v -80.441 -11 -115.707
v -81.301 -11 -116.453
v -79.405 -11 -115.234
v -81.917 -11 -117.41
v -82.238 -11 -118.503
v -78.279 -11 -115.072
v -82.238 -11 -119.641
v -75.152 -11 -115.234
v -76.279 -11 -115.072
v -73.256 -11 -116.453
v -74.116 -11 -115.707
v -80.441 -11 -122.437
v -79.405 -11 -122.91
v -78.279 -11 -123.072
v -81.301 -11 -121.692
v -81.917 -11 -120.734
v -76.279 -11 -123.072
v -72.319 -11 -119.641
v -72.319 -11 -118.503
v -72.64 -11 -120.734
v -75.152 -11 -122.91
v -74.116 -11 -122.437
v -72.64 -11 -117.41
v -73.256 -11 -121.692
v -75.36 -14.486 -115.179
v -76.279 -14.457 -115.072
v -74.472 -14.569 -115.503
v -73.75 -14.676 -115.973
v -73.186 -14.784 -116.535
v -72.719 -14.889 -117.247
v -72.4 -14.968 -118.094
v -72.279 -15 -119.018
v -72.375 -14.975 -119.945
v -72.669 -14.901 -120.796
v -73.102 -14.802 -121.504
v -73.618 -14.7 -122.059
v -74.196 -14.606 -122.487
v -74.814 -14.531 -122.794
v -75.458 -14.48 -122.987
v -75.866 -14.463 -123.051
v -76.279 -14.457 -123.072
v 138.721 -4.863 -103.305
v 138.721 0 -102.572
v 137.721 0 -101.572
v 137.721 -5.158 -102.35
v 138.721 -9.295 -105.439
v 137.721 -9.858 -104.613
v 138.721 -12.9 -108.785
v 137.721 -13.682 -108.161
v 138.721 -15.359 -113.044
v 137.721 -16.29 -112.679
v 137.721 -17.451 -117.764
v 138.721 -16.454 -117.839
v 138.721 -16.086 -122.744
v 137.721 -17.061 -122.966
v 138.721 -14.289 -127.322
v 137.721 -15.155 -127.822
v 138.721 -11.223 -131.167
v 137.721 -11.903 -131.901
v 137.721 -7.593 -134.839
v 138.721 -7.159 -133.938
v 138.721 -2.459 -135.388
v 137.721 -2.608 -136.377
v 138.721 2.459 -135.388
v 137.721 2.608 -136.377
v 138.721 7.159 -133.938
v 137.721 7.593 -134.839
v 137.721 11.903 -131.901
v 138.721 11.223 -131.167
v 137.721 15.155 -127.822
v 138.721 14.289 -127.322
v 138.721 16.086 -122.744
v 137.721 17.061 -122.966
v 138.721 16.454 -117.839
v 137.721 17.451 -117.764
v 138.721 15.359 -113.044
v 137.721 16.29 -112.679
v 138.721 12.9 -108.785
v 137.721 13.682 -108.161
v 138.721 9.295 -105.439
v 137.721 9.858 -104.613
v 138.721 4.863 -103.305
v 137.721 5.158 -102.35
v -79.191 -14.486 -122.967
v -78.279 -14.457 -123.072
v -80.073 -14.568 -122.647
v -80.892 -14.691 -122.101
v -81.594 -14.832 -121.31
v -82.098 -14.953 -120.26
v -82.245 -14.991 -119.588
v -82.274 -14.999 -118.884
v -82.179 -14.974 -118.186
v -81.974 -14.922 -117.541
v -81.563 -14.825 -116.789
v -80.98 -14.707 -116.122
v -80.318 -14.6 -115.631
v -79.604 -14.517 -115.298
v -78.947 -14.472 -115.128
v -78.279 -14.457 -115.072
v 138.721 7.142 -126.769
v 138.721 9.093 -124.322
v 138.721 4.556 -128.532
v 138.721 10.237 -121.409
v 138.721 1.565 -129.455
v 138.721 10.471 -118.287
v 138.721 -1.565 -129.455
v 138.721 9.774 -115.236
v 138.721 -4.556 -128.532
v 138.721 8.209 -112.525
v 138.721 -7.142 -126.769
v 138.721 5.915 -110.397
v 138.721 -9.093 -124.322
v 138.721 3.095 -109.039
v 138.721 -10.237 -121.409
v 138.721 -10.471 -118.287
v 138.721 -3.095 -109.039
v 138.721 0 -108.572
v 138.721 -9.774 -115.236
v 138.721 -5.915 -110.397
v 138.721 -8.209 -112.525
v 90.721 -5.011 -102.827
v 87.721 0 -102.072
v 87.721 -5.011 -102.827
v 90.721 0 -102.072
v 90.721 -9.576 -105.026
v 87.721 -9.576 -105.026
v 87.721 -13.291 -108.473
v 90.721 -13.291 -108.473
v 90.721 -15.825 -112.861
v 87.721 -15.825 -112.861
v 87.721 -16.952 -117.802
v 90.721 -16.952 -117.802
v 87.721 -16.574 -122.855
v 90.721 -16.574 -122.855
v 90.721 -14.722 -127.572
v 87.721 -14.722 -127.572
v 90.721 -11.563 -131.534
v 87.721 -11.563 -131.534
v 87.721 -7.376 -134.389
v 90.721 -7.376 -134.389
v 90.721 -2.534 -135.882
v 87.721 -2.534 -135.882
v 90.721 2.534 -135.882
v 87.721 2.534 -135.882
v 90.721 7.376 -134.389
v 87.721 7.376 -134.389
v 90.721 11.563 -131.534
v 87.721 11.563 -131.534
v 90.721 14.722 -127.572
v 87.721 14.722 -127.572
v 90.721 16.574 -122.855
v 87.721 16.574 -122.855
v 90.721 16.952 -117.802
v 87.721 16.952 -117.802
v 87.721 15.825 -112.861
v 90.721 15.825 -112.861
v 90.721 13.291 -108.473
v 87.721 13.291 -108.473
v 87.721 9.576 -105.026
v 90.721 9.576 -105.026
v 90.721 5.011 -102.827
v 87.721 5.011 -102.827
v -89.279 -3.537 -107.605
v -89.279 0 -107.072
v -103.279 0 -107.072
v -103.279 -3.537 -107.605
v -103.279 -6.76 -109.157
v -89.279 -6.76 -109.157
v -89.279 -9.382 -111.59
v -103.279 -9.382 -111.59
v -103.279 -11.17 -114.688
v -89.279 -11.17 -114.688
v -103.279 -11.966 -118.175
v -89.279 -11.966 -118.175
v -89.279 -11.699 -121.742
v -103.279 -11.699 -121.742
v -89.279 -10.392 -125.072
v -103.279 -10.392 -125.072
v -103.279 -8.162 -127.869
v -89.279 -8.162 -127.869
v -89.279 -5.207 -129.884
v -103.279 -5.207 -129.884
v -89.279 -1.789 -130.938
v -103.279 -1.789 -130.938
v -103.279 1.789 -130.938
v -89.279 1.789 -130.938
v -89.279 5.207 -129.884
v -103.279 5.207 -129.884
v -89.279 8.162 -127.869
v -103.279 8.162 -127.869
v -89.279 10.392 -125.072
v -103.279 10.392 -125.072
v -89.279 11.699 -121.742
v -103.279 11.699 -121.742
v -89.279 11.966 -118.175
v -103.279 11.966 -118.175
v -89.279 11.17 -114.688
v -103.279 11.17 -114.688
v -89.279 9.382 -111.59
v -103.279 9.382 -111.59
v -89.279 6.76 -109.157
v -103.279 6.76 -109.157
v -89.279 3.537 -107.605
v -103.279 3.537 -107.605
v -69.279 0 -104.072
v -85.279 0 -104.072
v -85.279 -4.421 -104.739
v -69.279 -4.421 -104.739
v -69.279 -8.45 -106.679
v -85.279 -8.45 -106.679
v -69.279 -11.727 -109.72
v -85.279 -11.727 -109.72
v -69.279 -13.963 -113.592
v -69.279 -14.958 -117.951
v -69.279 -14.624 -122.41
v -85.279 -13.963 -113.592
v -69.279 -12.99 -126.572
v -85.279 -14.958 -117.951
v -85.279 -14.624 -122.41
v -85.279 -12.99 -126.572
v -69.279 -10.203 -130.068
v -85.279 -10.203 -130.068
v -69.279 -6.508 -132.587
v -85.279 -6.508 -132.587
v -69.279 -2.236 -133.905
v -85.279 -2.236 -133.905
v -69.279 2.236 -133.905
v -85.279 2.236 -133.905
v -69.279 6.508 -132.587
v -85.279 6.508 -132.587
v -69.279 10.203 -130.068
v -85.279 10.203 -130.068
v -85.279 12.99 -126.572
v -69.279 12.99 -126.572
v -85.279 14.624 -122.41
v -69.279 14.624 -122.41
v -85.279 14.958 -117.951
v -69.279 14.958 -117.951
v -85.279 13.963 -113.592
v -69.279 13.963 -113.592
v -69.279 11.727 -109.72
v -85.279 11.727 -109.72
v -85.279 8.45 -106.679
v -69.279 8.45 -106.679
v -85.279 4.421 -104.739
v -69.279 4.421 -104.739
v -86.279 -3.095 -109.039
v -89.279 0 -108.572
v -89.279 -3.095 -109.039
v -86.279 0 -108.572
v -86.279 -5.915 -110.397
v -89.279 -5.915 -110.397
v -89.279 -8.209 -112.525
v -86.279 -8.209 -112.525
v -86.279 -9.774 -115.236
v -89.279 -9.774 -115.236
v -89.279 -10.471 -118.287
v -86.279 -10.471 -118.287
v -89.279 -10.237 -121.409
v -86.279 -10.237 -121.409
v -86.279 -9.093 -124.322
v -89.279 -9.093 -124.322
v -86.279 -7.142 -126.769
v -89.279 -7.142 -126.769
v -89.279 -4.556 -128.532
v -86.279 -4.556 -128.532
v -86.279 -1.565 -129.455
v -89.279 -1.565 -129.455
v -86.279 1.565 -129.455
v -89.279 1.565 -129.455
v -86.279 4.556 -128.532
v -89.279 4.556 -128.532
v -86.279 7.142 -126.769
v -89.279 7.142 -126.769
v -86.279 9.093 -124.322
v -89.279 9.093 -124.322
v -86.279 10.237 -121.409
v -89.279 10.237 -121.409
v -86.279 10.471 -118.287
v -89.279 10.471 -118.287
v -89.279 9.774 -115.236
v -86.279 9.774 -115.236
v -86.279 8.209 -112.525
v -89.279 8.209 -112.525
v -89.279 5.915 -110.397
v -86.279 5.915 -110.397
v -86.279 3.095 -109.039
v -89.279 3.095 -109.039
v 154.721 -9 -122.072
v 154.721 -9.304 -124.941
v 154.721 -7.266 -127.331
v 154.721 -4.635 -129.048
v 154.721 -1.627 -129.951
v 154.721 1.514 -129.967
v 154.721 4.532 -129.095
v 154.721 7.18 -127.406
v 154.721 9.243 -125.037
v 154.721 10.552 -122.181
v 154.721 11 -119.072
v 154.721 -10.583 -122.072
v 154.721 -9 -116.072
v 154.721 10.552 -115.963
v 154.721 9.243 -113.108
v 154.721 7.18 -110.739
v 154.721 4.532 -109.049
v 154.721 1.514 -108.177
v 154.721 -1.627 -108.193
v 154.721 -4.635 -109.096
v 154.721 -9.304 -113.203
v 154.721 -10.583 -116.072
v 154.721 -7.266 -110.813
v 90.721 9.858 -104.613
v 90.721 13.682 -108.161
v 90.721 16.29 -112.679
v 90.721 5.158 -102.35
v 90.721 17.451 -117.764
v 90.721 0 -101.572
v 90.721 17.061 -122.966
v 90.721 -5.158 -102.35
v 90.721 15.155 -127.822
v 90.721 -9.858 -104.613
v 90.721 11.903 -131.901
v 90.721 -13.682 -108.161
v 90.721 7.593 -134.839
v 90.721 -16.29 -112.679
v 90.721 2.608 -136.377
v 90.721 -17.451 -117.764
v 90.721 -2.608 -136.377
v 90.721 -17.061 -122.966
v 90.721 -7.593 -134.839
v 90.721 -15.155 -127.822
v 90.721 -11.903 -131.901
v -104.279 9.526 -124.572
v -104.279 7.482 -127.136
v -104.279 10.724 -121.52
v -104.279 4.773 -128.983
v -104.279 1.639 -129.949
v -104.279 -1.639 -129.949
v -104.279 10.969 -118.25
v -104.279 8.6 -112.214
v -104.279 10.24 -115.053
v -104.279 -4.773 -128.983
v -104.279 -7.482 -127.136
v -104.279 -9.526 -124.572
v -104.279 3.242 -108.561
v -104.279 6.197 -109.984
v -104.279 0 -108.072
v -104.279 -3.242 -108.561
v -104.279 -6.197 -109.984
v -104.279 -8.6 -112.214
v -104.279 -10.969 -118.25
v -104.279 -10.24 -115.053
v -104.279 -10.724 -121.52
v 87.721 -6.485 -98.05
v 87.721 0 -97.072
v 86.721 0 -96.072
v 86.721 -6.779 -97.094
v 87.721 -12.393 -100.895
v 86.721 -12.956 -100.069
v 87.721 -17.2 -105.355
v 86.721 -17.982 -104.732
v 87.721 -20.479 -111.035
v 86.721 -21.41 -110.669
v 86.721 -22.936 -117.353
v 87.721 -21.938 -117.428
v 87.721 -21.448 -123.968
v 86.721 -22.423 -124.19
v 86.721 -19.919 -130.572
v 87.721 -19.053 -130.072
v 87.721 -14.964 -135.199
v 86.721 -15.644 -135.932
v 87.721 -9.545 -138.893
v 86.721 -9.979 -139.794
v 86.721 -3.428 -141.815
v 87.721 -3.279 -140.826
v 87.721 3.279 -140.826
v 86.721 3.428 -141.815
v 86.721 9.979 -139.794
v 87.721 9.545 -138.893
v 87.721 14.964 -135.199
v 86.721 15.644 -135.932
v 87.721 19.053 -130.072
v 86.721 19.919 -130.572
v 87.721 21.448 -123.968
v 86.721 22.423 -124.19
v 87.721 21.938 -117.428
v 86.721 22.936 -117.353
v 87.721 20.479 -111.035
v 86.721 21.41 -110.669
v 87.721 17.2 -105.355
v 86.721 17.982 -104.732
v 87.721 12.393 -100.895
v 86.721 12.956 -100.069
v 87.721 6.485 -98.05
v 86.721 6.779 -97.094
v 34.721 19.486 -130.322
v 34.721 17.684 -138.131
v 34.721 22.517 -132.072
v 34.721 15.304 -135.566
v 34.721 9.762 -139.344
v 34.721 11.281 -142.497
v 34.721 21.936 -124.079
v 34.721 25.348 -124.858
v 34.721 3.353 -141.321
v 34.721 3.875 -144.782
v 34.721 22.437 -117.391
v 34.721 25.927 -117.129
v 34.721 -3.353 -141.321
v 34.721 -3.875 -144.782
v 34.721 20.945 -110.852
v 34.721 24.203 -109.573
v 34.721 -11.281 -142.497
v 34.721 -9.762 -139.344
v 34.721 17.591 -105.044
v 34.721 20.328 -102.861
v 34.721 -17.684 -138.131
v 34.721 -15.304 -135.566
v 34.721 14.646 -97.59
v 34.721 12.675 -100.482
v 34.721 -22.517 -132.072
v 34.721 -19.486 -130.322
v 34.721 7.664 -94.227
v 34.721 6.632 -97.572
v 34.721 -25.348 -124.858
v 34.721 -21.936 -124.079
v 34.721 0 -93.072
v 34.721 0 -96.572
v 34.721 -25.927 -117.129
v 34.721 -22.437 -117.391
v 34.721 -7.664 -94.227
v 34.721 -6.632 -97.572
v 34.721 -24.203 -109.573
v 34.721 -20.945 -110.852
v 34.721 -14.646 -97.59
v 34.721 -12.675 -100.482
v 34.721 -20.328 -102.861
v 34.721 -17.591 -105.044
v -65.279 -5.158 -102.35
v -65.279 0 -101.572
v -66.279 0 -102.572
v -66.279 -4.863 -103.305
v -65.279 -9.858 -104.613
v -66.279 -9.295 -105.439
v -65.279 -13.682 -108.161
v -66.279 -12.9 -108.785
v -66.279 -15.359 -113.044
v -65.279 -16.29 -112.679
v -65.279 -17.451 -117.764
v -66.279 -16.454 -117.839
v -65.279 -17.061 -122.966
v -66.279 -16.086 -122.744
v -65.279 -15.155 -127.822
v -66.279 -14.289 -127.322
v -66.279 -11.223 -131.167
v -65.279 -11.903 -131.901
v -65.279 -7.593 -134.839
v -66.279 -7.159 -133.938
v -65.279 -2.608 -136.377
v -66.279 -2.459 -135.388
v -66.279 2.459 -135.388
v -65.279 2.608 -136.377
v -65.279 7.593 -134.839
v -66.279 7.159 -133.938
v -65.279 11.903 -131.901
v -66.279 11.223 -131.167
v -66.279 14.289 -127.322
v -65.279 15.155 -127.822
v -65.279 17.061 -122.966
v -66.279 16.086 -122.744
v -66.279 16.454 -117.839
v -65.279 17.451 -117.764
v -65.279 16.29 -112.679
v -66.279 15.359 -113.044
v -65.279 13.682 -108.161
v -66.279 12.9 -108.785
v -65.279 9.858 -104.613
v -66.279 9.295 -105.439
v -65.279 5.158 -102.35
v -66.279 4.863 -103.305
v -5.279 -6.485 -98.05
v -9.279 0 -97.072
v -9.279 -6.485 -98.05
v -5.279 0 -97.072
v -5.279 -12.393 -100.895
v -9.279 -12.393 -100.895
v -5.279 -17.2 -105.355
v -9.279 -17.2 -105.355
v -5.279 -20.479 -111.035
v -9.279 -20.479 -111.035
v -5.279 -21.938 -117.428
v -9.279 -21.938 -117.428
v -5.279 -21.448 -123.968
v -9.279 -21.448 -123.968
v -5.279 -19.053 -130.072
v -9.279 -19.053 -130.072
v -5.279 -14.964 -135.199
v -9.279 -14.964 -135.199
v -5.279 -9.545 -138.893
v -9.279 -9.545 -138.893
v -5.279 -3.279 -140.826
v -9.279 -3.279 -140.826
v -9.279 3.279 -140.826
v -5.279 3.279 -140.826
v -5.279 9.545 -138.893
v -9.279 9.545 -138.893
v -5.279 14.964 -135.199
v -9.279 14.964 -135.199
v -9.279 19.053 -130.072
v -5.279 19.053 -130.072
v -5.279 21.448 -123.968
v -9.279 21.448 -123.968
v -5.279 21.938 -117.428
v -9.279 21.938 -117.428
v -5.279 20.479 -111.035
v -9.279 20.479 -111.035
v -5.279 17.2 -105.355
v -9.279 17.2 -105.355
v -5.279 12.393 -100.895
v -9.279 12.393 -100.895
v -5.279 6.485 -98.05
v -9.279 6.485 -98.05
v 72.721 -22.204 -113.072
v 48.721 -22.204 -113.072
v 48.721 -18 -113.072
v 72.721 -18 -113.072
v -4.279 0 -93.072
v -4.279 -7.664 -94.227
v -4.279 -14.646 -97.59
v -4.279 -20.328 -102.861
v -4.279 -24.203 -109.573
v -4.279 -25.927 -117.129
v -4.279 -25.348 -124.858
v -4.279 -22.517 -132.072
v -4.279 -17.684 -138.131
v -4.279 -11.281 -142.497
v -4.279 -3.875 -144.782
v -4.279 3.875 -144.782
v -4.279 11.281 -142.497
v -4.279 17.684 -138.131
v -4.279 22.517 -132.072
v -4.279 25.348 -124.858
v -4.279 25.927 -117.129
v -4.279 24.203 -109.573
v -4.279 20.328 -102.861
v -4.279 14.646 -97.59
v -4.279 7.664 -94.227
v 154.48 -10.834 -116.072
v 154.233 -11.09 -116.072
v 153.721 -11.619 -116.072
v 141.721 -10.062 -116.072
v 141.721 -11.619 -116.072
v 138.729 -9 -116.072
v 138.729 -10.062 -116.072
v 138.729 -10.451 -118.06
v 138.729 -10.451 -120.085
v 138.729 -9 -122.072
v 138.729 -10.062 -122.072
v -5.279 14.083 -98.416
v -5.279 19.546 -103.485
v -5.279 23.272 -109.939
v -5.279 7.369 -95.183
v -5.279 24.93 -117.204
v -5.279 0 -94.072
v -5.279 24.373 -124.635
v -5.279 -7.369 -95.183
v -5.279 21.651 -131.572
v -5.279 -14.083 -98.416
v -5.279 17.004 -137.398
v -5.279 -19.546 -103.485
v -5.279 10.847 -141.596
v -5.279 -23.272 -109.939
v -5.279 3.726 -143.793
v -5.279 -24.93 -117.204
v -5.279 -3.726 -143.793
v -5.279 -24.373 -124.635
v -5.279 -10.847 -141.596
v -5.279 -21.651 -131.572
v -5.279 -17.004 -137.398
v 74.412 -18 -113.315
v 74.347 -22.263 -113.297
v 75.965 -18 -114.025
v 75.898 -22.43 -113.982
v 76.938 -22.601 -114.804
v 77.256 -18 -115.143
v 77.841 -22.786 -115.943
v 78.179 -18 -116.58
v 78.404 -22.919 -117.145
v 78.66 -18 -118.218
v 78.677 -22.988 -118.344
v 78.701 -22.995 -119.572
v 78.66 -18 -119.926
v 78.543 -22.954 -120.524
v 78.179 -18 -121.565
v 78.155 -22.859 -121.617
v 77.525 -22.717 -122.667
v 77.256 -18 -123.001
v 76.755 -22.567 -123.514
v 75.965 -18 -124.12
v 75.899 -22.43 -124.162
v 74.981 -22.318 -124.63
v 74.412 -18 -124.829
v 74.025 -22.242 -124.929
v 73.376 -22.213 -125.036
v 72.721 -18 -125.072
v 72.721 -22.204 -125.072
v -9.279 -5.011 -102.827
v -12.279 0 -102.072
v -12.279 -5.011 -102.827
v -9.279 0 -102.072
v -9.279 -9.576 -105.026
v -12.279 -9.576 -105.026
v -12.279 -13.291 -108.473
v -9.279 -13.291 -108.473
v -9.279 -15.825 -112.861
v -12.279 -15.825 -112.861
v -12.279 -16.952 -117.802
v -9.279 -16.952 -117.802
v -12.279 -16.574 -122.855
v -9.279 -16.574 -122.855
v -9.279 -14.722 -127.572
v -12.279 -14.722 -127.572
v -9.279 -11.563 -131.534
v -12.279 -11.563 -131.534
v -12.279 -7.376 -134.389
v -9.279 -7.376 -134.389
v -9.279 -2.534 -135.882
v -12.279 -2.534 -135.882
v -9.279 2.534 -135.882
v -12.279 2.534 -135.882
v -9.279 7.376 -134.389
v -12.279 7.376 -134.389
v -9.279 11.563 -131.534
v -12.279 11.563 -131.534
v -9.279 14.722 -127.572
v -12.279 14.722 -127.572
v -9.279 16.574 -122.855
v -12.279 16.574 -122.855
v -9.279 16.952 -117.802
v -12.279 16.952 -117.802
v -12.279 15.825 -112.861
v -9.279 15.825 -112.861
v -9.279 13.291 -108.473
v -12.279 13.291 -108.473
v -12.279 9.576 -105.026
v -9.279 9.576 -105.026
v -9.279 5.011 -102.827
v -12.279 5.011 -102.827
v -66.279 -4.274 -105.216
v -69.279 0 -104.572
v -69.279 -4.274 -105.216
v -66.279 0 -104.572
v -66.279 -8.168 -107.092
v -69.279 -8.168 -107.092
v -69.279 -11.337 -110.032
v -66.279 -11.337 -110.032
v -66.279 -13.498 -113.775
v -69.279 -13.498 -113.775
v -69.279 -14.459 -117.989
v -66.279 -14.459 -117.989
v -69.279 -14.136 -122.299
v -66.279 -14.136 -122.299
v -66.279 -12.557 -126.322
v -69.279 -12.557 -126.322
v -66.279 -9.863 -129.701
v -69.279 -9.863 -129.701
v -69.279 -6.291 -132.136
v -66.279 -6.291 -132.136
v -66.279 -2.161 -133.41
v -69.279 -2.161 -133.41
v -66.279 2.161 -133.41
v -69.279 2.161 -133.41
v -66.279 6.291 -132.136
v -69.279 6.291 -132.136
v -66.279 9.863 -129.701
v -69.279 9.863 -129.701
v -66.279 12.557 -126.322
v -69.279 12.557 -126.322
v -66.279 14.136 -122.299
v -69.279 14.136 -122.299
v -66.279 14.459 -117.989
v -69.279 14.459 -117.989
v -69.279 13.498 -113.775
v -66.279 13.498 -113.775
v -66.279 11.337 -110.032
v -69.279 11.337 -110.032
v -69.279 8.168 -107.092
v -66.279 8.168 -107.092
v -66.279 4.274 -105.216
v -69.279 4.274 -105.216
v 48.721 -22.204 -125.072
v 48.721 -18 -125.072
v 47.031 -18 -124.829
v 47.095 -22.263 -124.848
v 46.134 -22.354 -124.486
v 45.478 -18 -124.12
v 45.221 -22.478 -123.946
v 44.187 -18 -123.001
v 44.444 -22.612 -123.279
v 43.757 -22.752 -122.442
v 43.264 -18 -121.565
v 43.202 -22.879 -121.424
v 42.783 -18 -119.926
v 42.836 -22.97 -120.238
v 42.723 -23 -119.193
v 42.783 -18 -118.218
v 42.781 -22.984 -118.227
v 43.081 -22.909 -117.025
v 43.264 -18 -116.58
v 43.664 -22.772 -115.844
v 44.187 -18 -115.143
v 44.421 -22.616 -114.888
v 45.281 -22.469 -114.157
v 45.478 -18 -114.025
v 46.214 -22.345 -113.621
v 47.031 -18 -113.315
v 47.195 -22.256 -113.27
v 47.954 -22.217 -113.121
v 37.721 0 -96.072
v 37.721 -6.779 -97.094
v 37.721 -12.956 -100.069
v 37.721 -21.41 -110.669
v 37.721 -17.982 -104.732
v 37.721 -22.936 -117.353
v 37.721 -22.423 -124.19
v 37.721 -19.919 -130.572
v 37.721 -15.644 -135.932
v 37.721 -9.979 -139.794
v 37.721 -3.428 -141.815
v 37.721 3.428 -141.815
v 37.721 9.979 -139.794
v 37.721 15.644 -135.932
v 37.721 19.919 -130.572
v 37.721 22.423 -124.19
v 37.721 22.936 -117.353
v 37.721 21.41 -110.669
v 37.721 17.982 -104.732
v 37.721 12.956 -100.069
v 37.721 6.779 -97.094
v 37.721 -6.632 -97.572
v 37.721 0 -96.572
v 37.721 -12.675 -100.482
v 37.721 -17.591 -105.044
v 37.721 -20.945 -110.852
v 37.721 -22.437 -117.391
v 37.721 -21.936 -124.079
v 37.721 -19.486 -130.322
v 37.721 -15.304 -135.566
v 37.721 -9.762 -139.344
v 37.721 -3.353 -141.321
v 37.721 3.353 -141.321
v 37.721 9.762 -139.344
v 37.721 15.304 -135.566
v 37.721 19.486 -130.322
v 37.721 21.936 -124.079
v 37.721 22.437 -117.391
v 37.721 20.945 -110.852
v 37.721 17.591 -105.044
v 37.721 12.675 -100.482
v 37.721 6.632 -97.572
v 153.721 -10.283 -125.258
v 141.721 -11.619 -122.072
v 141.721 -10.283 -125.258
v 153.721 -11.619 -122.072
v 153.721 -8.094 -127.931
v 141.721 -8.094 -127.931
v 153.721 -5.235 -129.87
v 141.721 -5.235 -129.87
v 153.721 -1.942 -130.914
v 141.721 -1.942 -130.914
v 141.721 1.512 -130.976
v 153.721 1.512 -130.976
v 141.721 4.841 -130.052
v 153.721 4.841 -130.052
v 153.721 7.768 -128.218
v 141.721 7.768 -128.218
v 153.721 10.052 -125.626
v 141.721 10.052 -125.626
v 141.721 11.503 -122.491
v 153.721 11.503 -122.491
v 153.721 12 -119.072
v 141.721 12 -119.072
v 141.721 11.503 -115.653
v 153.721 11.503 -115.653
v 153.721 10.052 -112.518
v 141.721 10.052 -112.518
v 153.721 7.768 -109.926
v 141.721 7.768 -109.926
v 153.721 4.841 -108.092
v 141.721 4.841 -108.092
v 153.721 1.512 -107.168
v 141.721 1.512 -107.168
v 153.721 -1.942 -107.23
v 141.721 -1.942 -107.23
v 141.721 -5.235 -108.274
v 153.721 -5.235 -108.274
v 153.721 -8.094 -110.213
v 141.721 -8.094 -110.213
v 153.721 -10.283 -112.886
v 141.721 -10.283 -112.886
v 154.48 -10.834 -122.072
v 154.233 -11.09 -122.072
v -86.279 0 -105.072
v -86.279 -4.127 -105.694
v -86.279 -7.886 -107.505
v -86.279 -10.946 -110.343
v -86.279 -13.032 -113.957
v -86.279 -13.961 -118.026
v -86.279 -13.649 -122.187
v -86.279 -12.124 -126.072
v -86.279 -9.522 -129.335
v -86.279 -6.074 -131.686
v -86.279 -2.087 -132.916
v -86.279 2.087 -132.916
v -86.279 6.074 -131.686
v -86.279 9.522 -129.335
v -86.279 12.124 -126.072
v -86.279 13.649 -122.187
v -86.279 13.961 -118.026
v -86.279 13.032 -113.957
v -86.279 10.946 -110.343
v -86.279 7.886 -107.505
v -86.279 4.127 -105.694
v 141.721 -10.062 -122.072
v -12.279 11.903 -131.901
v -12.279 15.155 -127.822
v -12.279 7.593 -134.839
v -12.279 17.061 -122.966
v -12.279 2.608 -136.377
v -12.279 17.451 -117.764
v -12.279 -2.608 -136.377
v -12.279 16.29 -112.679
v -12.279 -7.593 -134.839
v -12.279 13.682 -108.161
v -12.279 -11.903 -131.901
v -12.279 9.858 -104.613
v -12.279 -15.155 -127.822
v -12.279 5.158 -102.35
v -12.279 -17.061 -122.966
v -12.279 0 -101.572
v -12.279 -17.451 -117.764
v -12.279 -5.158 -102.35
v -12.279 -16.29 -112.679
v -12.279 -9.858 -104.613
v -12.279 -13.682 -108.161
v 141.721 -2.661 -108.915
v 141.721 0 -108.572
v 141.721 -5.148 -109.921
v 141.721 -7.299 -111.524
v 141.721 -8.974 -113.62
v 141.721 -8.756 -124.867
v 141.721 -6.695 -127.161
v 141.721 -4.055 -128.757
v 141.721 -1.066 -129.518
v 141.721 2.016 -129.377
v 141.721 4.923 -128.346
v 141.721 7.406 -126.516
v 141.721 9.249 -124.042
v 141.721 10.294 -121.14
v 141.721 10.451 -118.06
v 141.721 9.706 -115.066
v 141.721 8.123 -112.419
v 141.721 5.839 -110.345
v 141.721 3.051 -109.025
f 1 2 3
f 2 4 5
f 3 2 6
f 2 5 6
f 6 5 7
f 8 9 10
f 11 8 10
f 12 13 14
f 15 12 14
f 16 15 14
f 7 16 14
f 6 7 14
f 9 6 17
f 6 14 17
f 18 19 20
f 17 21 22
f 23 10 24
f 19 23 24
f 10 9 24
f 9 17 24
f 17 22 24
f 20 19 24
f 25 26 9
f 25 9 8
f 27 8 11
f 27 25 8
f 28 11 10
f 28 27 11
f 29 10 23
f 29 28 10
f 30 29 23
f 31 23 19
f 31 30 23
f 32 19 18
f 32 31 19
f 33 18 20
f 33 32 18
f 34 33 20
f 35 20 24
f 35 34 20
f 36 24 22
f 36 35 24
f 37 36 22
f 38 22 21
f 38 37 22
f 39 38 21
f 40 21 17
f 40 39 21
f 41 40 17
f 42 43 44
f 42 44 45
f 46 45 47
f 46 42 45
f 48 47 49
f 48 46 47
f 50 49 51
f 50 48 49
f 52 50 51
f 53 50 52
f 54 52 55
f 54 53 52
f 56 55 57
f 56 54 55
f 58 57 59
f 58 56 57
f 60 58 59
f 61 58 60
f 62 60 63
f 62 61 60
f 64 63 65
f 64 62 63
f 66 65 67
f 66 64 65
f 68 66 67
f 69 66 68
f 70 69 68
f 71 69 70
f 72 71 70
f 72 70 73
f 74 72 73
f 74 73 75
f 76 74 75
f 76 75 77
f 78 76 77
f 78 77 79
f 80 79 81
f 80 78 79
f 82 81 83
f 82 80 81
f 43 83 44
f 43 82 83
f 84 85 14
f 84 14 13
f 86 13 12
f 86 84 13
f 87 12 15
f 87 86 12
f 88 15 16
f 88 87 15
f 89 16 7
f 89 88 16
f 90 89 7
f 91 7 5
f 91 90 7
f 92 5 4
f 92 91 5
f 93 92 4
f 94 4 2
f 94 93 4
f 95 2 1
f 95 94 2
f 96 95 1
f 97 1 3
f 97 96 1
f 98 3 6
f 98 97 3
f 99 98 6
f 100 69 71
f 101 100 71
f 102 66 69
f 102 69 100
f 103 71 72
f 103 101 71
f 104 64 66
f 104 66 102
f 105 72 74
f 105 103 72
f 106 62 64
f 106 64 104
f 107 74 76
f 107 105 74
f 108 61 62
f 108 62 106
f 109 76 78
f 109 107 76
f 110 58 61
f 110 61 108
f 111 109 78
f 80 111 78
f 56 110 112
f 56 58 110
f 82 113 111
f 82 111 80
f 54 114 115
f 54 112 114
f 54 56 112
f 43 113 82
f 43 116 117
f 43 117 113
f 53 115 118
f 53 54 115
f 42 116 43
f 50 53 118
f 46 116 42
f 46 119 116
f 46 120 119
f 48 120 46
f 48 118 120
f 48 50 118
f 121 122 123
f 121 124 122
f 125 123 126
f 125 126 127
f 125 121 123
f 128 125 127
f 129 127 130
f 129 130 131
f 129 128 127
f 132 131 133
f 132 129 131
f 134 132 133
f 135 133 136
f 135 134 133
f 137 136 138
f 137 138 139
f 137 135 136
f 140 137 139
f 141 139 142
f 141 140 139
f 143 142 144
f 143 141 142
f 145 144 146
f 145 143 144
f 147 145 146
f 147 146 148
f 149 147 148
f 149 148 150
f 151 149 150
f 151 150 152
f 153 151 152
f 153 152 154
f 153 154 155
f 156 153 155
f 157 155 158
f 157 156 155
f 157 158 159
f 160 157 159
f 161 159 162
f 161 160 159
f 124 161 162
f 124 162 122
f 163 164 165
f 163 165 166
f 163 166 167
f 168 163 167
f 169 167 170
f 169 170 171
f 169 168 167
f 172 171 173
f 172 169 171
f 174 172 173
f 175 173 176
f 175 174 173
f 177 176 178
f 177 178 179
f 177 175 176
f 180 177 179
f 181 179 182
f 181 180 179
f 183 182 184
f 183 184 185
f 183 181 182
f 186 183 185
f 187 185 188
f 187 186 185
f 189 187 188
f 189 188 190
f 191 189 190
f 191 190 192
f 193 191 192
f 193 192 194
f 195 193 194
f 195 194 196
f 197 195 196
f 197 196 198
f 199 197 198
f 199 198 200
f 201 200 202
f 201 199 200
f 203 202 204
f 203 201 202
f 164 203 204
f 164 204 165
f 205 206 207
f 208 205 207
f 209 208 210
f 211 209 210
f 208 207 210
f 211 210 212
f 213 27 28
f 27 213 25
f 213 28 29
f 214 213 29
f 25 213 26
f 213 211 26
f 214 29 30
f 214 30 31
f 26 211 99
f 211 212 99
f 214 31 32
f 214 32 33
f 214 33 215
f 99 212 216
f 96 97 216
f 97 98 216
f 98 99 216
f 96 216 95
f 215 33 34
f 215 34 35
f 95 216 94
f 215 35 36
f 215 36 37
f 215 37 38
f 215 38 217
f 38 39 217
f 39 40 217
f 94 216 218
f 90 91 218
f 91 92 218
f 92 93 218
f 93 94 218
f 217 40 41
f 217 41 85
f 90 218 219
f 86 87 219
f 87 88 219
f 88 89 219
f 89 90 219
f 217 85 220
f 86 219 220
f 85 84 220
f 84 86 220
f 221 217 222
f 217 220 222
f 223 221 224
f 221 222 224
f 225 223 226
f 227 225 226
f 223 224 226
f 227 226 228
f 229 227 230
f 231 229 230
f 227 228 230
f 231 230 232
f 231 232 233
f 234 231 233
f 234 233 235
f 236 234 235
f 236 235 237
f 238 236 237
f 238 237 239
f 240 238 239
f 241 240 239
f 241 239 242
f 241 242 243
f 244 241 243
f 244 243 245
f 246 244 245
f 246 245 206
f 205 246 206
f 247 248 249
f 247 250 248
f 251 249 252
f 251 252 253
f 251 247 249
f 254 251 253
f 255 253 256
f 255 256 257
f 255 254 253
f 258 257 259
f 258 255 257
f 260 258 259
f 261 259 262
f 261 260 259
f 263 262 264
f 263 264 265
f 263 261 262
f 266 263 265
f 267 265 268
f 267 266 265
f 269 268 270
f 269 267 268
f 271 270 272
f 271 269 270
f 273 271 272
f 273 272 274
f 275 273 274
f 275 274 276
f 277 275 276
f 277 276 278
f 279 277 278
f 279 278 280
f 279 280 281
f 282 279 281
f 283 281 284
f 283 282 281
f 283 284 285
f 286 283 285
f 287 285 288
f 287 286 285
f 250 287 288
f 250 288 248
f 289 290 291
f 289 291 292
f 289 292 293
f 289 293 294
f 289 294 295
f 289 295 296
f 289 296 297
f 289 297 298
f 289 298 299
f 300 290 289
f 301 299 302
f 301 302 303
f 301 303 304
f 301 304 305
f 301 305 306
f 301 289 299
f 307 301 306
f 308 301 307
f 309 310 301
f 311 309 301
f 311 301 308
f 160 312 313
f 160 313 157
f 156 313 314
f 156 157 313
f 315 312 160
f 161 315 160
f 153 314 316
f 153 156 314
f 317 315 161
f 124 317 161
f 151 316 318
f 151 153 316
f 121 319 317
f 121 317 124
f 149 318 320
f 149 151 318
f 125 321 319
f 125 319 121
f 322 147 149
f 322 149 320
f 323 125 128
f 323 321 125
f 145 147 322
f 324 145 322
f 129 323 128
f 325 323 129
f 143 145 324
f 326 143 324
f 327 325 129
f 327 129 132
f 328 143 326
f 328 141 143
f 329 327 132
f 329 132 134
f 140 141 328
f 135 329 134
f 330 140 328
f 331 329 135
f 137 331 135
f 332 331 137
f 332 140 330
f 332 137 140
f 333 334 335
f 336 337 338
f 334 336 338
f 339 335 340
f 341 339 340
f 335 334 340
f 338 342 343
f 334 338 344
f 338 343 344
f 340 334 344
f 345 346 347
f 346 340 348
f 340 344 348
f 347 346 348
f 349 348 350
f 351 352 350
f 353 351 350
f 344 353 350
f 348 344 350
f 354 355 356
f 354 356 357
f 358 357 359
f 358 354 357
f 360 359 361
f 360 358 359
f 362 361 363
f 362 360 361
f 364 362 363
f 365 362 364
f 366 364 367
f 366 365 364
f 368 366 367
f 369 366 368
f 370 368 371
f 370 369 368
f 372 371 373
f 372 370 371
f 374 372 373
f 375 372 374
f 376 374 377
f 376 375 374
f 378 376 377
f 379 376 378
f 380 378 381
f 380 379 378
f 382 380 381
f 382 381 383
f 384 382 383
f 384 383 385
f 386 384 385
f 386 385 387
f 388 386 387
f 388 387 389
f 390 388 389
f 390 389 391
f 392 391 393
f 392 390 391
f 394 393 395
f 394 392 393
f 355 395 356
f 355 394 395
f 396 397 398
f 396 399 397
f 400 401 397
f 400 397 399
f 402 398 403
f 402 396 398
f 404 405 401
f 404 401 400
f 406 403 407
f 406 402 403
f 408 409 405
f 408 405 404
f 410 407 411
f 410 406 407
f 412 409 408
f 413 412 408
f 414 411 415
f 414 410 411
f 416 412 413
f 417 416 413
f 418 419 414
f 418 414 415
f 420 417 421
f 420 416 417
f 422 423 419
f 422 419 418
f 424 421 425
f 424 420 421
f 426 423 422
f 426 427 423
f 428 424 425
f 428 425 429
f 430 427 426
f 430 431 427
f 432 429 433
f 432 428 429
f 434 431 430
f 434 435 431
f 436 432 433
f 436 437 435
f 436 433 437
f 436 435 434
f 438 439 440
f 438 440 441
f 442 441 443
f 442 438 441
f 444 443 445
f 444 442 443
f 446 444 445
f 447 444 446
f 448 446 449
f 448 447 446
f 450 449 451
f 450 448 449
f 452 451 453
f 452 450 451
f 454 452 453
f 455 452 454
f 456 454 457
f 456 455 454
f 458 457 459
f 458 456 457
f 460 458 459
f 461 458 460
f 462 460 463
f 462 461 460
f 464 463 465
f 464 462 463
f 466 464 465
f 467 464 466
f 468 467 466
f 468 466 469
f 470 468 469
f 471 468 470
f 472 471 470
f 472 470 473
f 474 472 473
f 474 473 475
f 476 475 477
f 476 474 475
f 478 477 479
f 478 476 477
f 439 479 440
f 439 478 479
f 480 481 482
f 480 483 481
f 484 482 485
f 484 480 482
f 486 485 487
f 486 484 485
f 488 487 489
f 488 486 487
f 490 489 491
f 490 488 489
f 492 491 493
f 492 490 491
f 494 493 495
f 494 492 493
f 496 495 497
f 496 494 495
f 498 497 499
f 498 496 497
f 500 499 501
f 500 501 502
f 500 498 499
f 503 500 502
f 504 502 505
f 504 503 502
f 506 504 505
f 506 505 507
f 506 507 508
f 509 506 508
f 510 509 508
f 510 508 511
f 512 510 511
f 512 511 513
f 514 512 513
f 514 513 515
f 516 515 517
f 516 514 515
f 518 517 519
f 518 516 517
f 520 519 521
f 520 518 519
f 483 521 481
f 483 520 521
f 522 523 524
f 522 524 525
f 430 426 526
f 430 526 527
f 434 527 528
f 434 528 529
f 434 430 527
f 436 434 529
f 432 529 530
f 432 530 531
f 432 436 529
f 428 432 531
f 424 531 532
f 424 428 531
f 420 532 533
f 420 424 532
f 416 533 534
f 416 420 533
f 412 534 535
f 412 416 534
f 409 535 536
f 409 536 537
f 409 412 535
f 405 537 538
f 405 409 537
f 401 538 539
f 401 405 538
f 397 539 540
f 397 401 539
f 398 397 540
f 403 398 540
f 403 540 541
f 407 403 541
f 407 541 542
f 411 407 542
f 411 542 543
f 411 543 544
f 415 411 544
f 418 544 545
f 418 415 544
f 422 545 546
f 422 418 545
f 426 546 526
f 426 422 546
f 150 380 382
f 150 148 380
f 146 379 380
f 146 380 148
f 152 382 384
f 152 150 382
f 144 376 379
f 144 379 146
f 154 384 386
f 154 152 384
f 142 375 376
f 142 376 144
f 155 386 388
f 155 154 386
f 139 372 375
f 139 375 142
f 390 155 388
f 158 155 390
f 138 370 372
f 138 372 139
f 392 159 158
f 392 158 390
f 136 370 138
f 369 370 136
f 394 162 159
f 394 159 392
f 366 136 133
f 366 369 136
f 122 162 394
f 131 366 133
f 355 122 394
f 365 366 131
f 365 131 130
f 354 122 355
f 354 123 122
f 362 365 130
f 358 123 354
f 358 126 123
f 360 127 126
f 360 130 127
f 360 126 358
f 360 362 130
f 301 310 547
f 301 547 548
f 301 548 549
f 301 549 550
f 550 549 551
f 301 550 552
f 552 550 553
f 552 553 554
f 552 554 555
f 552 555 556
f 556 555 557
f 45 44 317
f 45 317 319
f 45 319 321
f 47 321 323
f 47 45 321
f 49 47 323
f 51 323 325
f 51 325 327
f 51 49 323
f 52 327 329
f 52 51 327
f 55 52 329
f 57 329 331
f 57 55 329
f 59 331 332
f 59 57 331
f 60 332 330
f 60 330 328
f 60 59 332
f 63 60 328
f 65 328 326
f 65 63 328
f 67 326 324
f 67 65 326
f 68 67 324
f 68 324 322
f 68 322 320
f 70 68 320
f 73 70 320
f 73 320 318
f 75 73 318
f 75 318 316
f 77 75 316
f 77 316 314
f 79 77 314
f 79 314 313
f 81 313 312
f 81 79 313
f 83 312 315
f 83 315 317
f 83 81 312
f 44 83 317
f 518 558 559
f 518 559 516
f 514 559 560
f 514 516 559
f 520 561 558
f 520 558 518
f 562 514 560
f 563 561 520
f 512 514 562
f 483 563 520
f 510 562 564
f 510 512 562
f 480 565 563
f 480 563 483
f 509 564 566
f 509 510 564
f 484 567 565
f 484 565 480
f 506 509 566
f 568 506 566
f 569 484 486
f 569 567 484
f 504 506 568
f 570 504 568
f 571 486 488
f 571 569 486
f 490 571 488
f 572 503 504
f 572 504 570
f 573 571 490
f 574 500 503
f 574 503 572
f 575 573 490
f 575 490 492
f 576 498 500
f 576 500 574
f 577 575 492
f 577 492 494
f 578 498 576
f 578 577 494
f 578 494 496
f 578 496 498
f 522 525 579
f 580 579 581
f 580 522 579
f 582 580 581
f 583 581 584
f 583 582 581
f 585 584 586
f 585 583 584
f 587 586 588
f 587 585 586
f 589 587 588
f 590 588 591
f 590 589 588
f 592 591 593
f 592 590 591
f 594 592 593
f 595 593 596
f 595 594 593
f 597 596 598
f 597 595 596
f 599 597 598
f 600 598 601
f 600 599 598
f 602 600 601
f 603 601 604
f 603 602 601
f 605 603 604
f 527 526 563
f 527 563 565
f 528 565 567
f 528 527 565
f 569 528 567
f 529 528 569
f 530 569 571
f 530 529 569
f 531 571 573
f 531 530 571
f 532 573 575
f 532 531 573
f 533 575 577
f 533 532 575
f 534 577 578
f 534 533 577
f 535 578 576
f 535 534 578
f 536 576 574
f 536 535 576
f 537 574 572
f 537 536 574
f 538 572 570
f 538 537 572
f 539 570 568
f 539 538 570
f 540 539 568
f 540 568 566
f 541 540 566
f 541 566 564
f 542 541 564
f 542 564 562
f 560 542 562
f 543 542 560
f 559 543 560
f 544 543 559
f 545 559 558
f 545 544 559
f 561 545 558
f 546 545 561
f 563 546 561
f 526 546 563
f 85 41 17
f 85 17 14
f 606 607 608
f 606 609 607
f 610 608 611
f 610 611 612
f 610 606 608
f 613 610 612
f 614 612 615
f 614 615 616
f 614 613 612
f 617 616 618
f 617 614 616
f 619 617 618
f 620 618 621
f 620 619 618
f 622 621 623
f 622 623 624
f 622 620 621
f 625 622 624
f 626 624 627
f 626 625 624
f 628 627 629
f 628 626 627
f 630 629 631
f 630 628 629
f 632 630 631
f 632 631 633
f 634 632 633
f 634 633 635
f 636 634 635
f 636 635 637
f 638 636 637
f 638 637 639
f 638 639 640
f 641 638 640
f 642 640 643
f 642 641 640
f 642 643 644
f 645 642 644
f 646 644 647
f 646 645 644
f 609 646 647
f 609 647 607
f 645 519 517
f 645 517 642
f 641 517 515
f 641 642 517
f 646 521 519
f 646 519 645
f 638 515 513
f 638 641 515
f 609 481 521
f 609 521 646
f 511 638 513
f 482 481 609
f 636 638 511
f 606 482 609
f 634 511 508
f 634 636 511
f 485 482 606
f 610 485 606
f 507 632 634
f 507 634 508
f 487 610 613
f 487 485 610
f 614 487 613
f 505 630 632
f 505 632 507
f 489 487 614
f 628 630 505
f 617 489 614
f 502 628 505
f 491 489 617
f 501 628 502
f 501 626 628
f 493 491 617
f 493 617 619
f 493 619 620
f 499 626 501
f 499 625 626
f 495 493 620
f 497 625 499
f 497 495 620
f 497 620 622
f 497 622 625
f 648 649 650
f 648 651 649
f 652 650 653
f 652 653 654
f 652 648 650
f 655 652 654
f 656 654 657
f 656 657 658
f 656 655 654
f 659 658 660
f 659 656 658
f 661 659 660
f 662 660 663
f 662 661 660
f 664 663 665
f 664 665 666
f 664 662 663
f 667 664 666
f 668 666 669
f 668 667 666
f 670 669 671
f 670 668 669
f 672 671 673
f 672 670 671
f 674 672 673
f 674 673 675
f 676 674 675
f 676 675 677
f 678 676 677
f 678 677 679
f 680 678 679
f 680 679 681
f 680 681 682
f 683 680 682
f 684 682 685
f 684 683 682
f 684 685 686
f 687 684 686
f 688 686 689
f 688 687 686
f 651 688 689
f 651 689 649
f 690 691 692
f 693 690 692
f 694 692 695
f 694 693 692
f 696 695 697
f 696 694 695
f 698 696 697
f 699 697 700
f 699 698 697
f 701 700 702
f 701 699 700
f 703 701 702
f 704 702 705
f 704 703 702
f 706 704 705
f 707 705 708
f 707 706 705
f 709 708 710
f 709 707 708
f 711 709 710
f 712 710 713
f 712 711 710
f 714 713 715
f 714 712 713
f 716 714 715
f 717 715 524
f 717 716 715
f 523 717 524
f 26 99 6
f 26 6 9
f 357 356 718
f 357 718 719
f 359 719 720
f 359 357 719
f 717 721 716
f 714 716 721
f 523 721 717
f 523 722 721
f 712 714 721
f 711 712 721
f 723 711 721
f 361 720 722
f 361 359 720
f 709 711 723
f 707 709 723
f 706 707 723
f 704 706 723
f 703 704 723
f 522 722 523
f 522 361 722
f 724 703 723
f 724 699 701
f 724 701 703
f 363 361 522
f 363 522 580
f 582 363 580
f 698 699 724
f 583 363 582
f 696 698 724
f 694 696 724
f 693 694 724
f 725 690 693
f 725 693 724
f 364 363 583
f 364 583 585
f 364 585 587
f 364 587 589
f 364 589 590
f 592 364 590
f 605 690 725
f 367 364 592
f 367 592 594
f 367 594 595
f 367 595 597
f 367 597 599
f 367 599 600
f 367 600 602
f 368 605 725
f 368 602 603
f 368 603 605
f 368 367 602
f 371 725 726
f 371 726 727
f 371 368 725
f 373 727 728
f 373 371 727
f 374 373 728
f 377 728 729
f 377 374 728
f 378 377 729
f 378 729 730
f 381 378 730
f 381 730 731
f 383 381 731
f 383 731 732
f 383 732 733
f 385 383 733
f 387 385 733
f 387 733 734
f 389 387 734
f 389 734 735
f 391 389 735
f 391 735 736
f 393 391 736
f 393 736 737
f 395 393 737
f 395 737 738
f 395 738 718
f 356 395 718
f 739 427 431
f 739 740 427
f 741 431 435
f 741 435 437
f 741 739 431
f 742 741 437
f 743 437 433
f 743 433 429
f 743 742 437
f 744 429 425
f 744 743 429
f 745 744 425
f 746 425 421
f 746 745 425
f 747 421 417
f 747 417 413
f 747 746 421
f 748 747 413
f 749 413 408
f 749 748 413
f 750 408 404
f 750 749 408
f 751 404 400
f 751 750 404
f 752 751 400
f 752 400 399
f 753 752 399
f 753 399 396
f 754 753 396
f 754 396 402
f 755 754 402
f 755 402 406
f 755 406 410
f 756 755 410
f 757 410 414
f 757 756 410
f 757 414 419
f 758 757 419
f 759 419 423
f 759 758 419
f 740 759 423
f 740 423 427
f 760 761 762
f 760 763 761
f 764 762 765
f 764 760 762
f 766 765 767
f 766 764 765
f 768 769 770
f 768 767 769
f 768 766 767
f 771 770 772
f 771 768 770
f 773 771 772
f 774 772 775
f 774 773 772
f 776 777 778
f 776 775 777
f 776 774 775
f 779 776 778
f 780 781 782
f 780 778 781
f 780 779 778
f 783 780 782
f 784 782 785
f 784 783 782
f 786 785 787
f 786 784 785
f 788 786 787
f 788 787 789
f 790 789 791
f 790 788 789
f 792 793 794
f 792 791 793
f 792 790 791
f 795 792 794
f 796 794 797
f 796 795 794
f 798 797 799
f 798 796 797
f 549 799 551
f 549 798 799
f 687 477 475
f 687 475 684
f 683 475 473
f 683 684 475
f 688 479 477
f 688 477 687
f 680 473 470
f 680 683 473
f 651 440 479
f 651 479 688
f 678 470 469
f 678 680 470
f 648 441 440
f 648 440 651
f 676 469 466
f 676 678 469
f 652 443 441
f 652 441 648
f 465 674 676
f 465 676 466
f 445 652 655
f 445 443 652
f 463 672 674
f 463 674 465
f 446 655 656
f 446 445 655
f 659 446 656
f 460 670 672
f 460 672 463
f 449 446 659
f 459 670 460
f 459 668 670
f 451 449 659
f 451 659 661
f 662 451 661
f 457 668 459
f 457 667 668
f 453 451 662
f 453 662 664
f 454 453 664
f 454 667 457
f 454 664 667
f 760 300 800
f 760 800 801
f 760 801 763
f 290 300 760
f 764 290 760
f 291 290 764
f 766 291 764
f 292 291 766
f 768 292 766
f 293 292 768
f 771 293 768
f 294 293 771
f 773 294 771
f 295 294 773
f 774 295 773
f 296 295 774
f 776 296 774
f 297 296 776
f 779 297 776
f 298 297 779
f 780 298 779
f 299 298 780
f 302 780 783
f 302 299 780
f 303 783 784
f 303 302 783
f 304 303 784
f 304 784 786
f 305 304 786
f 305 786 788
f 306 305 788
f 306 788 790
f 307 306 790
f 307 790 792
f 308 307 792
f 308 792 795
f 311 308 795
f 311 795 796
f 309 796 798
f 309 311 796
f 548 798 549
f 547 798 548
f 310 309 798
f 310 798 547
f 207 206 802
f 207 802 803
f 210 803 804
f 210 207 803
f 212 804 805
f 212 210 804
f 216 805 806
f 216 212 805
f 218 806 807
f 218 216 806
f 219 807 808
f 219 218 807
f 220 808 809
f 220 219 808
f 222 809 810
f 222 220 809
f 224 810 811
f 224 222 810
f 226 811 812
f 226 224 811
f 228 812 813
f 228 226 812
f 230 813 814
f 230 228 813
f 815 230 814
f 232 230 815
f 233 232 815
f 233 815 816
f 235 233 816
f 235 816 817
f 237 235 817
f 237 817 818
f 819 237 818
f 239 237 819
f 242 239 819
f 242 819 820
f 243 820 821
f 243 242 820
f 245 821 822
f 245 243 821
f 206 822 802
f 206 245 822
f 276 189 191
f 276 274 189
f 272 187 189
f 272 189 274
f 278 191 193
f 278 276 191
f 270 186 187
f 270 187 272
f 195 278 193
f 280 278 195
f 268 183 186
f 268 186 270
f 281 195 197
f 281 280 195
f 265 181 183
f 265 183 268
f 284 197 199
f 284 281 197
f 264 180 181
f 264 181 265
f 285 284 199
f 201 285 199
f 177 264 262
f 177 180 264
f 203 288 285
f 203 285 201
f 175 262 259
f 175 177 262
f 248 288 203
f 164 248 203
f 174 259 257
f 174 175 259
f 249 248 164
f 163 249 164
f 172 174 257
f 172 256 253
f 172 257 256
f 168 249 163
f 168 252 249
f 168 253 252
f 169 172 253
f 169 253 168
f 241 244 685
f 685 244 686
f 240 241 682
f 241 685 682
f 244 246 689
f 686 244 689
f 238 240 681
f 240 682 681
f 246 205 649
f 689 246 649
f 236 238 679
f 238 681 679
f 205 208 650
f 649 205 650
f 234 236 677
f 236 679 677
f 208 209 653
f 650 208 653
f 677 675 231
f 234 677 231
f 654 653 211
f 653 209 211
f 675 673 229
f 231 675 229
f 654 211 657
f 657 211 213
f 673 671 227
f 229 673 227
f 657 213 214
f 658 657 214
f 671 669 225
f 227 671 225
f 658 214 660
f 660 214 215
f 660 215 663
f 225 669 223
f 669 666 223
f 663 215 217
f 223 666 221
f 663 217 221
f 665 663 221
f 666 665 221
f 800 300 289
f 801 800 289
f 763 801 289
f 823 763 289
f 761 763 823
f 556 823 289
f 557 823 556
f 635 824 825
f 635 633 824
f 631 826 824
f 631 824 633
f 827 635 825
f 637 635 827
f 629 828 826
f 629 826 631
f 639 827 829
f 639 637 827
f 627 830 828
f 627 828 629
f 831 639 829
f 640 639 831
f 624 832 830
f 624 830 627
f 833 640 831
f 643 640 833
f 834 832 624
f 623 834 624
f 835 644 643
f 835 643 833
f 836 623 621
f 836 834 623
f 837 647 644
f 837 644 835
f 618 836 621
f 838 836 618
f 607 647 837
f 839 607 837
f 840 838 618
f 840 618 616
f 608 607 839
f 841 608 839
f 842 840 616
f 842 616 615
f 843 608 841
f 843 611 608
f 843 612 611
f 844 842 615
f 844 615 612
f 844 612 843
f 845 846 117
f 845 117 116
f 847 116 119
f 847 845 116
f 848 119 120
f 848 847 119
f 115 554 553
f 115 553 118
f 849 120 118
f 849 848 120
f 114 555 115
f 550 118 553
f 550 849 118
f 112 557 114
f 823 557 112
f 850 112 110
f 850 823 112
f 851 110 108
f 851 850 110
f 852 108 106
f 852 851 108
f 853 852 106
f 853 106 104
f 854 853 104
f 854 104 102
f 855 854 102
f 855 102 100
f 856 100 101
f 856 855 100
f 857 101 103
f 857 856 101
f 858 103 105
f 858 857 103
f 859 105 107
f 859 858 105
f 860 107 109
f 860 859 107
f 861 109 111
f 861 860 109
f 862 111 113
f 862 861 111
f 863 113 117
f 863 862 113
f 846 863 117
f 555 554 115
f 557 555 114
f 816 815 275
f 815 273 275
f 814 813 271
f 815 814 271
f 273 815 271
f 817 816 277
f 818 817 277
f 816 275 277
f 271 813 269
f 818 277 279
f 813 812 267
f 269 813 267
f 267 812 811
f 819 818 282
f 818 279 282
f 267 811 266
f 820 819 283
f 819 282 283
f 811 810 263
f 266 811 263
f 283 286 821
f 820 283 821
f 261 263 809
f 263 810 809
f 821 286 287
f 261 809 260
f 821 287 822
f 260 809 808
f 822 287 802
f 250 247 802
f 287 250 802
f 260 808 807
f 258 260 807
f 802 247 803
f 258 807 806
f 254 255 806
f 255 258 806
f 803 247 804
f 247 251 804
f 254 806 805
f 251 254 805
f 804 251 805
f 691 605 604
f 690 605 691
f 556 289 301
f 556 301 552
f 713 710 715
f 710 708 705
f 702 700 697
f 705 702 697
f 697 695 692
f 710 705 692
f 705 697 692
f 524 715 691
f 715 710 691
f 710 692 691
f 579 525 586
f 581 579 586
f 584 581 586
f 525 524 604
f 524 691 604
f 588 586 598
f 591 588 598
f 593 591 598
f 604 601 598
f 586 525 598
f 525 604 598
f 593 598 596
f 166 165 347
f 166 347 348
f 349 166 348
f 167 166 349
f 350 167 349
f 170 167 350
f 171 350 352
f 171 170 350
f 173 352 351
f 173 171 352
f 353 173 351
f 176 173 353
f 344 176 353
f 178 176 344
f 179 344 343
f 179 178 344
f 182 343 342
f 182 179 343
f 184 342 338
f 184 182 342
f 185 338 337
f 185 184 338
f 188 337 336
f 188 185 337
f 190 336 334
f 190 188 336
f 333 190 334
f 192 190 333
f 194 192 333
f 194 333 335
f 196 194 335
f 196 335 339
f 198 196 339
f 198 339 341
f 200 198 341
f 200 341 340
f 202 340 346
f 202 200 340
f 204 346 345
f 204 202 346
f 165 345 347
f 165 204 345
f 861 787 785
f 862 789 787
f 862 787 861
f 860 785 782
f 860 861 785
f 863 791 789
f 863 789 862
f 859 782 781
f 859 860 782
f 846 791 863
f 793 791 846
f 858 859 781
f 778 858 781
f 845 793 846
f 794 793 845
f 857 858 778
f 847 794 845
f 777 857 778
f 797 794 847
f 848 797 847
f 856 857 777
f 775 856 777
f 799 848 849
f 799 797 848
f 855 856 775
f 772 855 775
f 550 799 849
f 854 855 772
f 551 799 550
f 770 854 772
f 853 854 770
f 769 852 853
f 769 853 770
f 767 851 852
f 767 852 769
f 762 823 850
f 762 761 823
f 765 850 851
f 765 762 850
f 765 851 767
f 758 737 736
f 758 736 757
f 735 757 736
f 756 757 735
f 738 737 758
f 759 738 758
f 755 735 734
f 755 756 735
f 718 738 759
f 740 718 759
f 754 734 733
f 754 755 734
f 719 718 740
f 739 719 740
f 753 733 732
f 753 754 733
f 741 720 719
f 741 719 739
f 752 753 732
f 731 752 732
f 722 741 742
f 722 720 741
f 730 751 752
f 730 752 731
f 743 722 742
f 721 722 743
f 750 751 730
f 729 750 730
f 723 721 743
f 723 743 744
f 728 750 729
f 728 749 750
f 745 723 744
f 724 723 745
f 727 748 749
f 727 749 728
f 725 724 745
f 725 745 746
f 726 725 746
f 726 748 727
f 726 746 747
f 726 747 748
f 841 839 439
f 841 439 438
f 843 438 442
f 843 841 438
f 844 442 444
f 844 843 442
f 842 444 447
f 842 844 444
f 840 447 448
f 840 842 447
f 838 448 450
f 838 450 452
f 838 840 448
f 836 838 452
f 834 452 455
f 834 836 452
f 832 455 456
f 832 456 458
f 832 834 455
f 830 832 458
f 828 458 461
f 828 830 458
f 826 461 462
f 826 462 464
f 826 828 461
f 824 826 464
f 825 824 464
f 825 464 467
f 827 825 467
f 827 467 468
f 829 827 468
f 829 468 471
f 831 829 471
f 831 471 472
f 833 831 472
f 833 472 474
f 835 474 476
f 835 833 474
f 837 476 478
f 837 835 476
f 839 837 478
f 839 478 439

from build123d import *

# Parameters (mm, degrees)
SKETCH_1_W          = 15
SKETCH_1_H          = 12
SKETCH_1_W_2        = 3
SKETCH_1_H_2        = 10.5
SKETCH_1_H_3        = 14.5
SKETCH_1_H_4        = 17
SKETCH_1_H_5        = 22.5
CHAMFER_1_SIZE      = 1
CUT_EXTRUDE_1_DEPTH = 4
CUT_EXTRUDE_2_DEPTH = 5
SKETCH_5_W          = 16
SKETCH_5_H          = 6
CUT_EXTRUDE_3_DEPTH = 3


with BuildPart() as part:
    # 草图1 → 旋转1 (revolve)
    with BuildSketch(Plane(origin=(0, 0, 0), x_dir=(1, 0, 0), z_dir=(0, 1, 0))):
        with Locations((-96.778500263, 113.072139402)):
            Rectangle(SKETCH_1_W, SKETCH_1_H)
        with Locations((-87.778500263, 113.822139402)):
            Rectangle(SKETCH_1_W_2, SKETCH_1_H_2)
        Polygon((-69.278500263, 119.072139402), (-69.278500263, 104.072139402), (-86.278500263, 104.072139402), (-86.278500263, 108.572139402), (-86.278500263, 119.072139402), align=None)
        with Locations((-67.778500263, 111.822139402)):
            Rectangle(SKETCH_1_W_2, SKETCH_1_H_3)
        Polygon((-66.278500263, 119.072139402), (-66.278500263, 104.572139402), (-66.278500263, 101.572139402), (-12.278500263, 101.572139402), (-12.278500263, 102.072139402), (-12.278500263, 119.072139402), align=None)
        with Locations((-10.778500263, 110.572139402)):
            Rectangle(SKETCH_1_W_2, SKETCH_1_H_4)
        Polygon((-5.278500263, 119.072139402), (-9.278500263, 119.072139402), (-9.278500263, 102.072139402), (-9.278500263, 97.072139402), (-5.278500263, 97.072139402), align=None)
        Polygon((34.721499737, 119.072139402), (-5.278500263, 119.072139402), (-5.278500263, 97.072139402), (-5.278500263, 93.072139402), (34.721499737, 93.072139402), (34.721499737, 96.572139402), align=None)
        with Locations((36.221499737, 107.822139402)):
            Rectangle(SKETCH_1_W_2, SKETCH_1_H_5)
        Polygon((87.721499737, 119.072139402), (37.721499737, 119.072139402), (37.721499737, 96.572139402), (37.721499737, 96.072139402), (87.721499737, 96.072139402), (87.721499737, 102.072139402), align=None)
        with Locations((89.221499737, 110.572139402)):
            Rectangle(SKETCH_1_W_2, SKETCH_1_H_4)
        Polygon((138.721499737, 119.072139402), (90.721499737, 119.072139402), (90.721499737, 102.072139402), (90.721499737, 101.572139402), (138.721499737, 101.572139402), (138.721499737, 104.257707549), (138.721499737, 107.072139402), (138.721499737, 108.572139402), align=None)
        with Locations((140.221499737, 113.822139402)):
            Rectangle(SKETCH_1_W_2, SKETCH_1_H_2)
        Polygon((154.721499737, 119.072139402), (141.721499737, 119.072139402), (141.721499737, 108.572139402), (141.721499737, 107.072139402), (154.721499737, 107.072139402), align=None)
    revolve(axis=Axis((-109.712030386, 0, -119.072139402), (1, 0, 0)))

    # 倒角1
    chamfer_1_edges = [part.edges().sort_by_distance(p)[0] for p in [
        (-104.278500263, 0, -131.072139402),
        (154.721499737, 0, -131.072139402),
        (138.721499737, 0, -136.572139402),
        (87.721499737, 0, -142.072139402),
        (-5.278500263, 0, -145.072139402),
        (-66.278500263, 0, -136.572139402),
        (-86.278500263, 0, -134.072139402),
    ]]
    chamfer(chamfer_1_edges, length=CHAMFER_1_SIZE)

    # 草图2 → 切除-拉伸1 (cut)
    with BuildSketch(Plane(origin=(0, -15, 0), x_dir=(-1, 0, 0), z_dir=(0, -1, 0))):
        with BuildLine():
            Line((78.278500263, 115.072139402), (76.278500263, 115.072139402))
            ThreePointArc((76.278500263, 115.072139402), (72.278500263, 119.072139402), (76.278500263, 123.072139402))
            Line((76.278500263, 123.072139402), (78.278500263, 123.072139402))
            ThreePointArc((78.278500263, 123.072139402), (82.278500263, 119.072139402), (78.278500263, 115.072139402))
        make_face()
    extrude(amount=-CUT_EXTRUDE_1_DEPTH, mode=Mode.SUBTRACT)

    # 草图3 → 切除-拉伸2 (cut)
    with BuildSketch(Plane(origin=(0, -23, 0), x_dir=(-1, 0, 0), z_dir=(0, -1, 0))):
        with BuildLine():
            Line((-48.721499737, 113.072139402), (-72.721499737, 113.072139402))
            ThreePointArc((-72.721499737, 113.072139402), (-78.721499737, 119.072139402), (-72.721499737, 125.072139402))
            Line((-72.721499737, 125.072139402), (-48.721499737, 125.072139402))
            ThreePointArc((-48.721499737, 125.072139402), (-42.721499737, 119.072139402), (-48.721499737, 113.072139402))
        make_face()
    extrude(amount=-CUT_EXTRUDE_2_DEPTH, mode=Mode.SUBTRACT)

    # 草图5 → 切除-拉伸3 (cut)
    with BuildSketch(Plane(origin=(0, -12, 0), x_dir=(-1, 0, 0), z_dir=(0, -1, 0))):
        with Locations((-146.728951344, 119.072139402)):
            Rectangle(SKETCH_5_W, SKETCH_5_H)
    extrude(amount=-CUT_EXTRUDE_3_DEPTH, mode=Mode.SUBTRACT)


solid = part.part
